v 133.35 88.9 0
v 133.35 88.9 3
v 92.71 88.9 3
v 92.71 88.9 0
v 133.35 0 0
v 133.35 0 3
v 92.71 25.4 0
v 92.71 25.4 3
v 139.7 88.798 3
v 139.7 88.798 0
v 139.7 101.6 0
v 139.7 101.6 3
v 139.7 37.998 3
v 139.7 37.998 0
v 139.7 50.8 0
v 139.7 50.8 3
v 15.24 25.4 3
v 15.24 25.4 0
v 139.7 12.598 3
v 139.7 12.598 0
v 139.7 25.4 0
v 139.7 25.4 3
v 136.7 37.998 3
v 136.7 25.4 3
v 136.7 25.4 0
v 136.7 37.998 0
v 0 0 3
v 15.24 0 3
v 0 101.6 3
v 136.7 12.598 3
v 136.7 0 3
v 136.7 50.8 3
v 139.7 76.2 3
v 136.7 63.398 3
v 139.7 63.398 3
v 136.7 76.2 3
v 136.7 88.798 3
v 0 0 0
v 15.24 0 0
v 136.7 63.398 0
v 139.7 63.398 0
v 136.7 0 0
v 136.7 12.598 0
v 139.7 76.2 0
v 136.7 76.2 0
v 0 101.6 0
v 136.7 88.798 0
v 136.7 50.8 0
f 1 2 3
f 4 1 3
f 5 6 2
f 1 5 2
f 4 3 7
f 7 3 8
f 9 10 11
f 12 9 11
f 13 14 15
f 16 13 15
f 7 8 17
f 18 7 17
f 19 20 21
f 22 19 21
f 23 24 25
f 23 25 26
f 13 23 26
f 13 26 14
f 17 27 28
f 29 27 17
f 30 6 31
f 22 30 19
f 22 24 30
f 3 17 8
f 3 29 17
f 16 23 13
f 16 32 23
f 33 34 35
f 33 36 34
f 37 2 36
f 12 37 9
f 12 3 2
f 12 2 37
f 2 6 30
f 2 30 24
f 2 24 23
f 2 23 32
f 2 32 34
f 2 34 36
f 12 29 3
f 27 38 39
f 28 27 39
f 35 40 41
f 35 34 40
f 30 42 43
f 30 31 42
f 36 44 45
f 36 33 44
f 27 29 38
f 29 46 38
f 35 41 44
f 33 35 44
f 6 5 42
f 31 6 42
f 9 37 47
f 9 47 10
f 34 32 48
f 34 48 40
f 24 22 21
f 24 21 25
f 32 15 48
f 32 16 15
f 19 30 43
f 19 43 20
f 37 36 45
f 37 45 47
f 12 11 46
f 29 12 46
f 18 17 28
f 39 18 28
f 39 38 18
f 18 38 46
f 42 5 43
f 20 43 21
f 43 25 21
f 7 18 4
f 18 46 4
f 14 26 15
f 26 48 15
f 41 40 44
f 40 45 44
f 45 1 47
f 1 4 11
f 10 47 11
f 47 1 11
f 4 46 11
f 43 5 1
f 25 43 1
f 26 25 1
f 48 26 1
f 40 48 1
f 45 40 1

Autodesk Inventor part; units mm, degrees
ref_plane "YZ Plane" through (0, 0, 0) normal (1, 0, 0) x (0, 1, 0)
ref_plane "XZ Plane" through (0, 0, 0) normal (0, 1, 0) x (-1, 0, 0)
ref_plane "XY Plane" through (0, 0, 0) normal (0, 0, 1) x (1, 0, 0)
sketch "Sketch1" plane through (0, 0, 0) normal (0, 0, 1) x (1, 0, 0)
  line L0 (0, 0) -> (139.7, 0)
  line L1 (139.7, 0) -> (139.7, 101.6)
  line L2 (139.7, 101.6) -> (0, 101.6)
  line L3 (0, 101.6) -> (0, 0)
  dimension "d0" = 139.7
  dimension "d1" = 101.6
extrude "Extrusion1" add sketch "Sketch1" along normal blind 3
sketch "Sketch2" plane through (0, 0, 3) normal (0, 0, 1) x (1, 0, 0)
  line L0 (0, 0) -> (139.7, 0) projected
  line L1 (92.71, 0) -> (133.35, 0)
  line L2 (133.35, 0) -> (133.35, 88.9)
  line L3 (133.35, 88.9) -> (92.71, 88.9)
  line L4 (92.71, 88.9) -> (92.71, 0)
  line L5 (139.7, 0) -> (139.7, 101.6) projected
  dimension "d4" = 88.9
  dimension "d5" = 6.35
  dimension "d6" = 40.64
extrude "Extrusion2" cut sketch "Sketch2" against normal blind 3.5
sketch "Sketch3" plane through (0, 0, 3) normal (0, 0, 1) x (1, 0, 0)
  line L0 (15.24, 0) -> (92.71, 0)
  line L1 (92.71, 0) -> (92.71, 25.4)
  line L2 (92.71, 25.4) -> (15.24, 25.4)
  line L3 (15.24, 25.4) -> (15.24, 0)
  line L4 (133.35, 88.9) -> (133.35, 0) projected
  line L5 (133.35, 0) -> (139.7, 0) projected
  line L6 (139.7, 0) -> (139.7, 101.6) projected
  line L7 (139.7, 101.6) -> (0, 101.6) projected
  line L8 (0, 101.6) -> (0, 0) projected
  line L9 (0, 0) -> (92.71, 0) projected
  line L10 (92.71, 0) -> (92.71, 88.9) projected
  line L11 (92.71, 88.9) -> (133.35, 88.9) projected
  dimension "d9" = 25.4
  dimension "d10" = 0
  dimension "d12" = 0
  dimension "d15" = 15.24
extrude "Extrusion3" cut sketch "Sketch3" against normal blind 3.5 contours L3 L2 L1 L0
sketch "Sketch5" plane through (0, 0, 3) normal (0, 0, 1) x (1, 0, 0)
  line L0 (15.24, 0) -> (15.24, 25.4) projected
  line L1 (15.24, 25.4) -> (92.71, 25.4) projected
  line L2 (92.71, 25.4) -> (92.71, 88.9) projected
  line L3 (92.71, 88.9) -> (133.35, 88.9) projected
  line L4 (133.35, 88.9) -> (133.35, 0) projected
  line L5 (133.35, 0) -> (139.7, 0) projected
  line L6 (139.7, 0) -> (139.7, 101.6) projected
  line L7 (139.7, 101.6) -> (0, 101.6) projected
  line L8 (0, 101.6) -> (0, 0) projected
  line L9 (0, 0) -> (15.24, 0) projected
  line L10 (139.7, 0) -> (136.7, 0)
  line L11 (136.7, 0) -> (136.7, 12.5984)
  line L12 (136.7, 12.5984) -> (139.7, 12.5984)
  line L13 (139.7, 12.5984) -> (139.7, 0)
  line L14 (136.7, 25.4) -> (136.7, 37.9984)
  line L15 (136.7, 37.9984) -> (139.7, 37.9984)
  line L16 (139.7, 25.4) -> (136.7, 25.4)
  line L17 (139.7, 37.9984) -> (139.7, 25.4)
  line L18 (136.7, 50.8) -> (136.7, 63.3984)
  line L19 (136.7, 63.3984) -> (139.7, 63.3984)
  line L20 (139.7, 50.8) -> (136.7, 50.8)
  line L21 (139.7, 63.3984) -> (139.7, 50.8)
  line L22 (136.7, 76.2) -> (136.7, 88.7984)
  line L23 (136.7, 88.7984) -> (139.7, 88.7984)
  line L24 (139.7, 76.2) -> (136.7, 76.2)
  line L25 (139.7, 88.7984) -> (139.7, 76.2)
  line L26 (136.7, 101.6) -> (136.7, 114.1984)
  line L27 (136.7, 114.1984) -> (139.7, 114.1984)
  line L28 (139.7, 101.6) -> (136.7, 101.6)
  line L29 (139.7, 114.1984) -> (139.7, 101.6)
  dimension "d27" = 3
  dimension "d28" = 12.5984
  dimension "d31" = 25.4
extrude "Extrusion5" cut sketch "Sketch5" against normal blind 3 contours L26 L27 L29 L7 | L6 L24 L22 L23 | L11 L12 L6 L5 | L6 L20 L18 L19 | L16 L14 L15 L6
properties part number "CANIMDWall"
